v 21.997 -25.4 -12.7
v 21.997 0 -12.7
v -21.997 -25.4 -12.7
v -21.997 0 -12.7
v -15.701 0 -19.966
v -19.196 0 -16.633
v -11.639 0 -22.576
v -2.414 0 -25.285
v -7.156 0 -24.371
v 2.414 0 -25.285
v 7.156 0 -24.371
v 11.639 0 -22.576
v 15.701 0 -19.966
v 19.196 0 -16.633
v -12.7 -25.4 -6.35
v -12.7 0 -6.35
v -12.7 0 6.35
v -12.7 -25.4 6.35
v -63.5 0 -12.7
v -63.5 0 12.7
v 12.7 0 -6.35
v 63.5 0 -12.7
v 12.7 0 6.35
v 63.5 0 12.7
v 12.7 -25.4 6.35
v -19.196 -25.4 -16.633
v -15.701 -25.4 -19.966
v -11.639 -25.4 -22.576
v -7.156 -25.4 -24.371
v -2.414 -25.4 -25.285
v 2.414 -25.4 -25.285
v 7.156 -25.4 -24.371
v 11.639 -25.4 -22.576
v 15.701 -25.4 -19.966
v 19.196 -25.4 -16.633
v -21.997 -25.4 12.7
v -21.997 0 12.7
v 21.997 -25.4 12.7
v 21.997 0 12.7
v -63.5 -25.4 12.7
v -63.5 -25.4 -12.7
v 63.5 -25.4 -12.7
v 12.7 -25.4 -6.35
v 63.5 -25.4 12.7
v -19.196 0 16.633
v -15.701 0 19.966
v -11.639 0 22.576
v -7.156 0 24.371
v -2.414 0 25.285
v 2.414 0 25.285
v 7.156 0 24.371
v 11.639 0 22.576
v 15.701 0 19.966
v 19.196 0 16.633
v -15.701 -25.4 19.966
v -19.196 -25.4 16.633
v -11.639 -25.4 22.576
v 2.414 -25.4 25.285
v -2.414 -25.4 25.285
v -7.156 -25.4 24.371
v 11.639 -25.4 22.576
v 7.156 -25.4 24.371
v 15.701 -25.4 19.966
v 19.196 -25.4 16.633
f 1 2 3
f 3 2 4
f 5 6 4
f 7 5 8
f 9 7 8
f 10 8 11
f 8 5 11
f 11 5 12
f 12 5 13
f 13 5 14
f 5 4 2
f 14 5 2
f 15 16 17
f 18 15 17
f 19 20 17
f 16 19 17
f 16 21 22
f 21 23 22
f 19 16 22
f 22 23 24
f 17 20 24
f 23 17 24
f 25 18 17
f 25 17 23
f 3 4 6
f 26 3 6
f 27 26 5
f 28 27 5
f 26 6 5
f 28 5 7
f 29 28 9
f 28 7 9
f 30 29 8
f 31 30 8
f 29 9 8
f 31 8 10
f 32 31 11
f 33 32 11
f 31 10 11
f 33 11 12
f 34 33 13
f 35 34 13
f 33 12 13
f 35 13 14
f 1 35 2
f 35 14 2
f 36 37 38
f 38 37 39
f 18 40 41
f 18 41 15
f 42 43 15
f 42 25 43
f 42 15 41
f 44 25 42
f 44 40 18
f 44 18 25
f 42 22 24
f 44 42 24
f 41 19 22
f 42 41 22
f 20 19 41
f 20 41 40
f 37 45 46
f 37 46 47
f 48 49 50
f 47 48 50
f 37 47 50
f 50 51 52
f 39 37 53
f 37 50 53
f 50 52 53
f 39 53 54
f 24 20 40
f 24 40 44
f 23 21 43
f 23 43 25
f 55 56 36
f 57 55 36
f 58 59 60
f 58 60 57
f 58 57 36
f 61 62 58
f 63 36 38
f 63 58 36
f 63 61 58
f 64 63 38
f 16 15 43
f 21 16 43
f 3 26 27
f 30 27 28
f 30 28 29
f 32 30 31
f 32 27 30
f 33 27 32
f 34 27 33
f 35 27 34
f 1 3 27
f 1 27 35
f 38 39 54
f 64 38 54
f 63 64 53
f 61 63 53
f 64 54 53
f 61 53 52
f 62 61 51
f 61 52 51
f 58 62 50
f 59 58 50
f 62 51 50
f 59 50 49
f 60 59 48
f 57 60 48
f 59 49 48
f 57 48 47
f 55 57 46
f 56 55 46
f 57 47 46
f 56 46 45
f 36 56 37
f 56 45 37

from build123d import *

# Parameters (mm, degrees)
F0_W     = 127
F0_H     = 25.4
F2_DEPTH = 25.4
F3_W     = 25.4
F3_H     = 12.7
F4_DEPTH = 25.4


with BuildPart() as f2:
    # F0 (on Front) → F2 (new body)
    with BuildSketch(Plane.XZ):
        Rectangle(F0_W, F0_H)
    extrude(amount=F2_DEPTH)

    # F3 (on face) → F4 (cut)
    with BuildSketch(Plane.XZ.offset(25.4)):
        Rectangle(F3_W, F3_H)
    extrude(amount=-F4_DEPTH, mode=Mode.SUBTRACT)


with BuildPart() as f2b:
    # F1 (on face) → F2, piece 2 (new body)
    with BuildSketch(Plane.XZ):
        with BuildLine():
            Line((-21.9970452561, 12.7), (21.9970452561, 12.7))
            ThreePointArc((21.9970452561, 12.7), (0, 25.4), (-21.9970452561, 12.7))
        make_face()
    extrude(amount=F2_DEPTH)


with BuildPart() as f2c:
    # F1 (on face) → F2, piece 3 (new body)
    with BuildSketch(Plane.XZ):
        with BuildLine():
            ThreePointArc((-21.9970452561, -12.7), (0, -25.4), (21.9970452561, -12.7))
            Line((21.9970452561, -12.7), (-21.9970452561, -12.7))
        make_face()
    extrude(amount=F2_DEPTH)


solid = Compound([f2.part, f2b.part, f2c.part])
